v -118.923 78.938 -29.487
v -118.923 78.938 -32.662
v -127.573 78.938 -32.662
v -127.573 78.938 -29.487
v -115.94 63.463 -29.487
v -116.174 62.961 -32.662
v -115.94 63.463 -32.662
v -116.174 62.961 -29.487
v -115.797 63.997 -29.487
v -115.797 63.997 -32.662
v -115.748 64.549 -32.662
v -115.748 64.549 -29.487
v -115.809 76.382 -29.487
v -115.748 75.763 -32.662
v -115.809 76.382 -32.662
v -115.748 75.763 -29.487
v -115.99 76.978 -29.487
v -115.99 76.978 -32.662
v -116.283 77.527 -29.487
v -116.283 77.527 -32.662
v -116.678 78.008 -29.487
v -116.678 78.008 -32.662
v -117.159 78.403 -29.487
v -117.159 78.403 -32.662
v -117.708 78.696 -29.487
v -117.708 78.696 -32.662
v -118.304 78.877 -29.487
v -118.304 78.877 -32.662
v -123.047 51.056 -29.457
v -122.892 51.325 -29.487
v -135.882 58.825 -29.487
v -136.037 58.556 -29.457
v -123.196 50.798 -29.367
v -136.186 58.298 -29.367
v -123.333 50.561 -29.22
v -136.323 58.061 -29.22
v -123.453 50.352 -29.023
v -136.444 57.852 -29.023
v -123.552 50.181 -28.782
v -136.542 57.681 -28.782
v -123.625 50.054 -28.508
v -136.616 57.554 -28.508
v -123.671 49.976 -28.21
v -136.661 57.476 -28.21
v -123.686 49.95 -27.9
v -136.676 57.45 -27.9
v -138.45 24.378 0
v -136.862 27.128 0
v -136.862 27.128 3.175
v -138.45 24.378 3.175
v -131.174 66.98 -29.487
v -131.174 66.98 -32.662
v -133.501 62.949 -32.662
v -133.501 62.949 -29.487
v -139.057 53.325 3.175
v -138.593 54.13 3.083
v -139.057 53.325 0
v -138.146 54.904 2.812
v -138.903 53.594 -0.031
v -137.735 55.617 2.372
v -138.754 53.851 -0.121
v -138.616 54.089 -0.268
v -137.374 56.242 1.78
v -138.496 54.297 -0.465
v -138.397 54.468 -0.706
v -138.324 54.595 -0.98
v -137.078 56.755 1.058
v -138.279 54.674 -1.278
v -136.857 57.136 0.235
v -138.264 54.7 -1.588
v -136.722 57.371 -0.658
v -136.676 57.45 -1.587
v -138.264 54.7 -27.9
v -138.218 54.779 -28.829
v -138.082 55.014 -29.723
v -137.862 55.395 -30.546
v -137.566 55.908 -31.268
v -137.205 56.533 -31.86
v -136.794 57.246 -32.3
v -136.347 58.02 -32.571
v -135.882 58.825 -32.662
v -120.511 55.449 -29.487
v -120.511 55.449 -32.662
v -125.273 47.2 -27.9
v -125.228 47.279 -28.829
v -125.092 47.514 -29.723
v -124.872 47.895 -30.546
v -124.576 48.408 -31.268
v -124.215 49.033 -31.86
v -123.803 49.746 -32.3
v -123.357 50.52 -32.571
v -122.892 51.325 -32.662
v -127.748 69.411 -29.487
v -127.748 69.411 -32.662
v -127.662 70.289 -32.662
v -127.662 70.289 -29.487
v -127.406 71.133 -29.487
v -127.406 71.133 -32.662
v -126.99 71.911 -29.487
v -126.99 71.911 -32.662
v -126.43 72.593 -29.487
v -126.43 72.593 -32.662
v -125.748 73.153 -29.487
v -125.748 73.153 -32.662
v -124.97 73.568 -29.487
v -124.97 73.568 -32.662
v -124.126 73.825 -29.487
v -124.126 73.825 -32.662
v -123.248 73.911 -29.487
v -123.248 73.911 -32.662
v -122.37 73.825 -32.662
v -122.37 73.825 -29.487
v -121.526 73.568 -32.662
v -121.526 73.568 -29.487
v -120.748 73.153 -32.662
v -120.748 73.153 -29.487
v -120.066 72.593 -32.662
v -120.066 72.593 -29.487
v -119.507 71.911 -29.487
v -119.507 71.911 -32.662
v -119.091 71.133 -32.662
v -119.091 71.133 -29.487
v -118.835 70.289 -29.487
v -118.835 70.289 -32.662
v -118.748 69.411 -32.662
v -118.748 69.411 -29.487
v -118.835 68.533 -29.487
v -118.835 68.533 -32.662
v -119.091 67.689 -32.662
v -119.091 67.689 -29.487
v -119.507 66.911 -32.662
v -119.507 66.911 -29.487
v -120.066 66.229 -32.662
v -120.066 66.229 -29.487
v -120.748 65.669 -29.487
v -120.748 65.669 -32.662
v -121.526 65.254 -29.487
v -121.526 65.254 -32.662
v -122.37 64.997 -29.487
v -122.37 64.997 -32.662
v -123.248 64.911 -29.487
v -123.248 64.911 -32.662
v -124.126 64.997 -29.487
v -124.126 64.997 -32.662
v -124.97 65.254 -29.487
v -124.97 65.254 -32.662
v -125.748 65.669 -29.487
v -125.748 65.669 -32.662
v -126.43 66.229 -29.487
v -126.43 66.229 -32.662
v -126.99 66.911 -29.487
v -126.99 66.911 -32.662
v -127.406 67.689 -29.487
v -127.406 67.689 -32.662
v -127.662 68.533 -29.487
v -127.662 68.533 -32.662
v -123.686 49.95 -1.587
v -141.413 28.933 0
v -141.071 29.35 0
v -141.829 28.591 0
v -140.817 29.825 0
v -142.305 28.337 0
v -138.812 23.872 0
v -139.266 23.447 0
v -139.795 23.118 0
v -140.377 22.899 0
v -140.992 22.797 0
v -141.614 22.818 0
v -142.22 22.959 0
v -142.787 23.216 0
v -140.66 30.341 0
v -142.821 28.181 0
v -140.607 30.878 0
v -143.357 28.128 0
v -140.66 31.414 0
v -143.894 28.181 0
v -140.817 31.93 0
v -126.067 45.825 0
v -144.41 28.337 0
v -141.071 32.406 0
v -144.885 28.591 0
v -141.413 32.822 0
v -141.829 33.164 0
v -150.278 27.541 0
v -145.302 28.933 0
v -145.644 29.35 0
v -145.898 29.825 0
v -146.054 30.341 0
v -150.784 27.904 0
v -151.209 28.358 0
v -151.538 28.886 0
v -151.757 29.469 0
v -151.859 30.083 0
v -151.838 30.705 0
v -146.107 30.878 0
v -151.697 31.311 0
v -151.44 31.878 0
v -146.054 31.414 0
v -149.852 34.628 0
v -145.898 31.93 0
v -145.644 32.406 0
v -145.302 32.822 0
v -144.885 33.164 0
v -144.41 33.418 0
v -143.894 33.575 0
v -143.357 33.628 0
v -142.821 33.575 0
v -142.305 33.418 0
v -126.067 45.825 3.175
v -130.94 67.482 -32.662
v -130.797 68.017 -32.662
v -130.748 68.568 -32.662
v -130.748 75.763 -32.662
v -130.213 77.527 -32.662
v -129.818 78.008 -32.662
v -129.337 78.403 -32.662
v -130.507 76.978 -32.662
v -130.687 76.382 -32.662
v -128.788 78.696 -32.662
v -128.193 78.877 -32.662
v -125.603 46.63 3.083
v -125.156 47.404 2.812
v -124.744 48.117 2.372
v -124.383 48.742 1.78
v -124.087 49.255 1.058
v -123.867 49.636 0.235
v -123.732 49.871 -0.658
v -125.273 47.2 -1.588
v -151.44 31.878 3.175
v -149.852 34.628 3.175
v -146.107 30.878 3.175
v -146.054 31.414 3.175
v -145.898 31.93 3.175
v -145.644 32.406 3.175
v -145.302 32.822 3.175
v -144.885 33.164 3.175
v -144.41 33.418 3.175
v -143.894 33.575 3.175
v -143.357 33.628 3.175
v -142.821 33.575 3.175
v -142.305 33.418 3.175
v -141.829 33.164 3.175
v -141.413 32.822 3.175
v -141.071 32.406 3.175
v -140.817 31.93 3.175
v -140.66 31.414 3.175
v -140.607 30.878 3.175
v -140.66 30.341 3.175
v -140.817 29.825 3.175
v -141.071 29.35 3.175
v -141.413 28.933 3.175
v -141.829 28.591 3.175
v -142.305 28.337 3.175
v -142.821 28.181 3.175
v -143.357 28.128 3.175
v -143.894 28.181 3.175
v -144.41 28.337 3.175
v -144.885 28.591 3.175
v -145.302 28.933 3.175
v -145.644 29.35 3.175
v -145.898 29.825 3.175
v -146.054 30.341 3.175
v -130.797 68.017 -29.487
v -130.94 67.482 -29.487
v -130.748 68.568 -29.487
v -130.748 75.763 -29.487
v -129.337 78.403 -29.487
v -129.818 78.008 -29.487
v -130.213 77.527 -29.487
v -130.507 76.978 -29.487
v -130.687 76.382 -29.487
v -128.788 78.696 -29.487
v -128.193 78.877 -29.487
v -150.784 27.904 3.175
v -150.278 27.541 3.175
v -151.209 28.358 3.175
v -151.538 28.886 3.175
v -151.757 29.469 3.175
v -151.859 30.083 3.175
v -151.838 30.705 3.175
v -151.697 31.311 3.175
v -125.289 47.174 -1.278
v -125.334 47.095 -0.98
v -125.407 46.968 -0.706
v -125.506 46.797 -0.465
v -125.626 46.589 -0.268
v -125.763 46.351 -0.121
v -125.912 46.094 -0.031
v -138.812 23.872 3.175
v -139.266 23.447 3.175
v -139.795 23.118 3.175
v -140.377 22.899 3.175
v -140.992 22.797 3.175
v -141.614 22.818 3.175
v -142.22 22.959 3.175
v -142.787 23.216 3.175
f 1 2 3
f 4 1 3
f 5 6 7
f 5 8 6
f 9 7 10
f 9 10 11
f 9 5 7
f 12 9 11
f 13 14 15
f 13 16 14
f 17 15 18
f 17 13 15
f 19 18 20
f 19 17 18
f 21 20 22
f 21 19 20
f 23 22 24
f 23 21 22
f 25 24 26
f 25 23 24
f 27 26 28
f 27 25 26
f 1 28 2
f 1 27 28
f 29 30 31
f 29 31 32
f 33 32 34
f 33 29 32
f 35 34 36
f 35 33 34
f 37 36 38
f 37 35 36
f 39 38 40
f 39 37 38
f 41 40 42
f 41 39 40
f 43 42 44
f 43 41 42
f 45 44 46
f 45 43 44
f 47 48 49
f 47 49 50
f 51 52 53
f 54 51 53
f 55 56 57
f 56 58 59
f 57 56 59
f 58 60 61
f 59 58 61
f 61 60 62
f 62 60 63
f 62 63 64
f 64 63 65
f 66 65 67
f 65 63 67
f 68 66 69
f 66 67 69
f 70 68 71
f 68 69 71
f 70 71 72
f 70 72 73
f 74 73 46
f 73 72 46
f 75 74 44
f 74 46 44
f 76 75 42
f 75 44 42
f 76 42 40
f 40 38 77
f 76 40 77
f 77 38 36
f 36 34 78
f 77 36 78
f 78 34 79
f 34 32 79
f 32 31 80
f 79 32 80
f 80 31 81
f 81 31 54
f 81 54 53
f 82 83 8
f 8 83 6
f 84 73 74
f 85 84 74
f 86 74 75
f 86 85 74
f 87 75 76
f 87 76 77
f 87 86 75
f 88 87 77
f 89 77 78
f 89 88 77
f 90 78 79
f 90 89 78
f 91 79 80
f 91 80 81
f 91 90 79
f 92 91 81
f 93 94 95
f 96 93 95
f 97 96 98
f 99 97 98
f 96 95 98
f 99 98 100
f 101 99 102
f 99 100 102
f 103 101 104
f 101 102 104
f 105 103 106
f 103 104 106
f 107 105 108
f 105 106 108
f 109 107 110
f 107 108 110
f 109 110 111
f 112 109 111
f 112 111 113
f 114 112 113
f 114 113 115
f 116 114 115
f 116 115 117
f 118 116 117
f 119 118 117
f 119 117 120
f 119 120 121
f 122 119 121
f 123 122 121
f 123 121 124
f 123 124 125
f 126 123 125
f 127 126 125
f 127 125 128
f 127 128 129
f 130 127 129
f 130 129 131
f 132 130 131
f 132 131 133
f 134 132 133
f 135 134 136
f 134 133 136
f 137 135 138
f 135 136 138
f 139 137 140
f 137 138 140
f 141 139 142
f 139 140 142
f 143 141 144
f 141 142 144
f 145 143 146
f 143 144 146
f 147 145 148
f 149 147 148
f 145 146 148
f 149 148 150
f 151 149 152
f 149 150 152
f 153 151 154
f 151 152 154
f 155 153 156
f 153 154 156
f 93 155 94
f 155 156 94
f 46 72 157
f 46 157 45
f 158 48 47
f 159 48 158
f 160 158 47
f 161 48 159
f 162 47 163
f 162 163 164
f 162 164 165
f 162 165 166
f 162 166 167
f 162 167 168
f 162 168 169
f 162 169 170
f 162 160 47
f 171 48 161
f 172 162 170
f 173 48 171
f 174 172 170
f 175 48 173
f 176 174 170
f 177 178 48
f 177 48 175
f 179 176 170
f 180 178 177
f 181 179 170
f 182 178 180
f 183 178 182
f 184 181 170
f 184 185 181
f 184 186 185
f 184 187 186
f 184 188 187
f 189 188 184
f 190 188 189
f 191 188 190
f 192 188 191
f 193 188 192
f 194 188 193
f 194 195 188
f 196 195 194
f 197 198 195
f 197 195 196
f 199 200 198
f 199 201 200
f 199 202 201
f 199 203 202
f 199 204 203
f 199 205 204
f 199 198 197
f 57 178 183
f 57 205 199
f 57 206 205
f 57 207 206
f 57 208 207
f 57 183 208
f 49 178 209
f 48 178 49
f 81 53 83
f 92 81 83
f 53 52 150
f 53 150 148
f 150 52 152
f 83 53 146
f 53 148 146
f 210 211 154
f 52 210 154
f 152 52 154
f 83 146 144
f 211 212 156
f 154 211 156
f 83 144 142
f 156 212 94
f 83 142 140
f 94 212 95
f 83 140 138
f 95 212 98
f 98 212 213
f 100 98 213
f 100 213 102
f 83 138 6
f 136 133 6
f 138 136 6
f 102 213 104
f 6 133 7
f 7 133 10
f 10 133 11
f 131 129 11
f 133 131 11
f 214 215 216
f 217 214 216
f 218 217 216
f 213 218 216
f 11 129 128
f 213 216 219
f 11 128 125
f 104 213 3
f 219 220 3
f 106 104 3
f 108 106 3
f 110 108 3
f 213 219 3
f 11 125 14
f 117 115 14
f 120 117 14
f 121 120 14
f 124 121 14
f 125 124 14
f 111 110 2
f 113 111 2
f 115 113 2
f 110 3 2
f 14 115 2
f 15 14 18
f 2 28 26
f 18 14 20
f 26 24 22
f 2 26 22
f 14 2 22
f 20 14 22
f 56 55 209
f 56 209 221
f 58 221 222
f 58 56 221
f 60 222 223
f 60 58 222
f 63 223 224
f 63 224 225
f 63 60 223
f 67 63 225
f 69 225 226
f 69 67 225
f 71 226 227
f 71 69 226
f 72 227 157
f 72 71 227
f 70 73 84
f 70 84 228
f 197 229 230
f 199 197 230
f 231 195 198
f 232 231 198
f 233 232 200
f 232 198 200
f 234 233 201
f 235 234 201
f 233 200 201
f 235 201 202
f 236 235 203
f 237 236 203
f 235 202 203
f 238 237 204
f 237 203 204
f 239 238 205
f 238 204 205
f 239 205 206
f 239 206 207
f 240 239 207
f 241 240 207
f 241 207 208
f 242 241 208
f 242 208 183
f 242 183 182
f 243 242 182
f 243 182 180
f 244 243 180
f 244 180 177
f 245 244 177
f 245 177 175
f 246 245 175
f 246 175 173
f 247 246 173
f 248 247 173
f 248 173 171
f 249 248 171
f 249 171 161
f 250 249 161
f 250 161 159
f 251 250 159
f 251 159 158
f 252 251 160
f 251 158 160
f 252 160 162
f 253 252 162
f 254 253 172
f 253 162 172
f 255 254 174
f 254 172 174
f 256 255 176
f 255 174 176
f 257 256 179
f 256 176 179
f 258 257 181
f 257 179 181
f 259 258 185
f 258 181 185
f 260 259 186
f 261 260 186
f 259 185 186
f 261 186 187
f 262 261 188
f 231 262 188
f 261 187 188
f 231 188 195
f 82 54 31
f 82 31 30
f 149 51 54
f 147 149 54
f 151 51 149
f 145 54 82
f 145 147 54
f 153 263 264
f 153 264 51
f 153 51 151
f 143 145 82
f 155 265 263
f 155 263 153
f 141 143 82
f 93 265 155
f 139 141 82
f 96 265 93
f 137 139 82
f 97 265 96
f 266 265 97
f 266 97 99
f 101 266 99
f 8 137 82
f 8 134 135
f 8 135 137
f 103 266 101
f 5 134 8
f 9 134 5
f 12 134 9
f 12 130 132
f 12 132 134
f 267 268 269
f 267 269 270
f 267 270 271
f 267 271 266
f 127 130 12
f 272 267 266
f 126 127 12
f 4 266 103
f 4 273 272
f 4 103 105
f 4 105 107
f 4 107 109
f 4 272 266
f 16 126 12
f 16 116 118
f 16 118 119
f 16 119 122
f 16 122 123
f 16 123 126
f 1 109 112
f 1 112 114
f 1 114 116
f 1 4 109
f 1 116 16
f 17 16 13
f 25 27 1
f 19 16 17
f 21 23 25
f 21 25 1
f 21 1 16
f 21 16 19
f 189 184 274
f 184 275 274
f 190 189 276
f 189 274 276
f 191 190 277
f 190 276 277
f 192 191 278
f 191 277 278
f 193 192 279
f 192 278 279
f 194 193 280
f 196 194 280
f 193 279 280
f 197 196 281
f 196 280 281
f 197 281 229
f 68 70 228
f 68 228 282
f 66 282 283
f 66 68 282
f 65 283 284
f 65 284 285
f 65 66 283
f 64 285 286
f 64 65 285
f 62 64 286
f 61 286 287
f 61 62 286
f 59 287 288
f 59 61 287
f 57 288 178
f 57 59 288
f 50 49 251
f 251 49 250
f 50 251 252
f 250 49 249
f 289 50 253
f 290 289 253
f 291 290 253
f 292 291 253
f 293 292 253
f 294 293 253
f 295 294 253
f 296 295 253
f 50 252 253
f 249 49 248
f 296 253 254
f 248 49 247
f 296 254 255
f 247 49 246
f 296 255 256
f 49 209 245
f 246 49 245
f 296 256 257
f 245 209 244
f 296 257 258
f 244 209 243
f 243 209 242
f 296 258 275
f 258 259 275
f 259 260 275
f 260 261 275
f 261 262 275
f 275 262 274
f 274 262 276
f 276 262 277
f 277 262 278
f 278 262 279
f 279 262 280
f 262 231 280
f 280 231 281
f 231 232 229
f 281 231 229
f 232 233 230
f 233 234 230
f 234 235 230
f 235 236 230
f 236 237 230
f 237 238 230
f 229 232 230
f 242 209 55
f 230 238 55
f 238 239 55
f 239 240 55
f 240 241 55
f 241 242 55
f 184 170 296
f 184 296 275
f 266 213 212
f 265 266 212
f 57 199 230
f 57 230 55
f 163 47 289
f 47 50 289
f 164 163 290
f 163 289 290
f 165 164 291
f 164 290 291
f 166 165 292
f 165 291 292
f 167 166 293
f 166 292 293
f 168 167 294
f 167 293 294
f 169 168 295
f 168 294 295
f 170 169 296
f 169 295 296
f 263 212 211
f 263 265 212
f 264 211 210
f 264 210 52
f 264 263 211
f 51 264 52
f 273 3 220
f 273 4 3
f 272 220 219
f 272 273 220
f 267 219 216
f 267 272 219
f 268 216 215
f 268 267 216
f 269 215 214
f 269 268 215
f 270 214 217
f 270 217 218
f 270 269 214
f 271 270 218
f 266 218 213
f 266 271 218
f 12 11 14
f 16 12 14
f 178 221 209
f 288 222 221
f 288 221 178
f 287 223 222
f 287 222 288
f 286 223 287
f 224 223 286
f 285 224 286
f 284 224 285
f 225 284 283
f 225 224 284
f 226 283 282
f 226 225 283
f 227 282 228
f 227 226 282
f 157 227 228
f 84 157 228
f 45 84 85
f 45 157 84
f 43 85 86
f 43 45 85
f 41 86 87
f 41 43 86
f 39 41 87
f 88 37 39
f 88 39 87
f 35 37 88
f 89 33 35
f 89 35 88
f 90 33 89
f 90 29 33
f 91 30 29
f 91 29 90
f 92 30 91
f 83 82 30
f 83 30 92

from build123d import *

# Parameters (mm, degrees)
BASE_FLANGE1_DEPTH   = 3.175
EDGE_FLANGE1_DEPTH   = 15
EDGE_FLANGE2_DEPTH   = 15
BOSS_EXTRUDE1_DEPTH  = 3.175
M5_CLEARANCE_HOLE1_D = 5.5
FILLET1_R            = 3.175
M8_CLEARANCE_HOLE1_D = 9


# Sheet-metal steps are written as plain solids
with BuildPart() as part:
    # Sketch2 → Base-Flange1 (new body)
    with BuildSketch(Plane.XY):
        Polygon((-136.862074611, 27.127820722), (-140.037074611, 21.628559408), (-153.027455668, 29.128559408), (-149.852455668, 34.627820722), (-139.057455668, 53.32530919), (-126.067074611, 45.82530919), align=None)
    extrude(amount=BASE_FLANGE1_DEPTH)

    # Edge-Flange1 section (across the edge) → Edge-Flange1 (add)
    with BuildSketch(Plane(origin=(-138.263705668, 54.700124518, 0), x_dir=(-0.49999999999999706, -0.8660254037844405, -3.491481338843133e-15), z_dir=(0.8660254037844405, -0.49999999999999706, 0))):
        with BuildLine():
            Line((-3.175, 1.5875), (-3.175, 27.899995))
            Line((-3.175, 27.899995), (0, 27.899995))
            Line((0, 27.899995), (0, 1.5875))
            ThreePointArc((0, 1.5875), (0.464967985, 0.464967985), (1.5875, 0))
            Line((1.5875, 0), (1.5875, -3.175))
            ThreePointArc((1.5875, -3.175), (-1.780096045, -1.780096045), (-3.175, 1.5875))
        make_face()
    extrude(amount=EDGE_FLANGE1_DEPTH)

    # Edge-Flange2 section (across the edge) → Edge-Flange2 (add)
    with BuildSketch(Plane(origin=(-123.685824611, 49.949755175, -29.487495), x_dir=(0, 0, 1), z_dir=(-0.8660254037844397, 0.4999999999999983, 0))):
        with BuildLine():
            Line((-3.175, 1.5875), (-3.175, 6.35))
            Line((-3.175, 6.35), (0, 6.35))
            Line((0, 6.35), (0, 1.5875))
            ThreePointArc((0, 1.5875), (0.464967985, 0.464967985), (1.5875, 0))
            Line((1.5875, 0), (1.5875, -3.175))
            ThreePointArc((1.5875, -3.175), (-1.780096045, -1.780096045), (-3.175, 1.5875))
        make_face()
    extrude(amount=EDGE_FLANGE2_DEPTH)

    # Sketch15 → Boss-Extrude1 (add)
    with BuildSketch(Plane(origin=(0, 0, -32.662495), x_dir=(-1, 0, 0), z_dir=(0, 0, -1))):
        Polygon((133.501205668, 62.949016489), (120.510824611, 55.449016489), (115.748324611, 63.69790846), (115.748324611, 78.93790846), (130.748324611, 78.93790846), (130.748324611, 67.717146347), align=None)
    extrude(amount=-BOSS_EXTRUDE1_DEPTH)

    # M5 Clearance Hole1 (through all)
    with Locations(Plane.XY.offset(3.175)):
        with Locations((-143.35726514, 30.877820722)):
            Hole(M5_CLEARANCE_HOLE1_D / 2)

    # Fillet1
    fillet1_edges = [part.edges().sort_by_distance(p)[0] for p in [
        (-140.037074611, 21.628559408, 1.5875),
        (-153.027455668, 29.128559408, 1.5875),
        (-130.748324611, 67.717146347, -31.074995),
        (-115.748324611, 63.69790846, -31.074995),
        (-115.748324611, 78.93790846, -31.074995),
        (-130.748324611, 78.93790846, -31.074995),
    ]]
    fillet(fillet1_edges, radius=FILLET1_R)

    # M8 Clearance Hole1 (through all)
    with Locations(Plane.XY.offset(-29.487495)):
        with Locations((-123.248324611, 69.41100346)):
            Hole(M8_CLEARANCE_HOLE1_D / 2)


solid = part.part
